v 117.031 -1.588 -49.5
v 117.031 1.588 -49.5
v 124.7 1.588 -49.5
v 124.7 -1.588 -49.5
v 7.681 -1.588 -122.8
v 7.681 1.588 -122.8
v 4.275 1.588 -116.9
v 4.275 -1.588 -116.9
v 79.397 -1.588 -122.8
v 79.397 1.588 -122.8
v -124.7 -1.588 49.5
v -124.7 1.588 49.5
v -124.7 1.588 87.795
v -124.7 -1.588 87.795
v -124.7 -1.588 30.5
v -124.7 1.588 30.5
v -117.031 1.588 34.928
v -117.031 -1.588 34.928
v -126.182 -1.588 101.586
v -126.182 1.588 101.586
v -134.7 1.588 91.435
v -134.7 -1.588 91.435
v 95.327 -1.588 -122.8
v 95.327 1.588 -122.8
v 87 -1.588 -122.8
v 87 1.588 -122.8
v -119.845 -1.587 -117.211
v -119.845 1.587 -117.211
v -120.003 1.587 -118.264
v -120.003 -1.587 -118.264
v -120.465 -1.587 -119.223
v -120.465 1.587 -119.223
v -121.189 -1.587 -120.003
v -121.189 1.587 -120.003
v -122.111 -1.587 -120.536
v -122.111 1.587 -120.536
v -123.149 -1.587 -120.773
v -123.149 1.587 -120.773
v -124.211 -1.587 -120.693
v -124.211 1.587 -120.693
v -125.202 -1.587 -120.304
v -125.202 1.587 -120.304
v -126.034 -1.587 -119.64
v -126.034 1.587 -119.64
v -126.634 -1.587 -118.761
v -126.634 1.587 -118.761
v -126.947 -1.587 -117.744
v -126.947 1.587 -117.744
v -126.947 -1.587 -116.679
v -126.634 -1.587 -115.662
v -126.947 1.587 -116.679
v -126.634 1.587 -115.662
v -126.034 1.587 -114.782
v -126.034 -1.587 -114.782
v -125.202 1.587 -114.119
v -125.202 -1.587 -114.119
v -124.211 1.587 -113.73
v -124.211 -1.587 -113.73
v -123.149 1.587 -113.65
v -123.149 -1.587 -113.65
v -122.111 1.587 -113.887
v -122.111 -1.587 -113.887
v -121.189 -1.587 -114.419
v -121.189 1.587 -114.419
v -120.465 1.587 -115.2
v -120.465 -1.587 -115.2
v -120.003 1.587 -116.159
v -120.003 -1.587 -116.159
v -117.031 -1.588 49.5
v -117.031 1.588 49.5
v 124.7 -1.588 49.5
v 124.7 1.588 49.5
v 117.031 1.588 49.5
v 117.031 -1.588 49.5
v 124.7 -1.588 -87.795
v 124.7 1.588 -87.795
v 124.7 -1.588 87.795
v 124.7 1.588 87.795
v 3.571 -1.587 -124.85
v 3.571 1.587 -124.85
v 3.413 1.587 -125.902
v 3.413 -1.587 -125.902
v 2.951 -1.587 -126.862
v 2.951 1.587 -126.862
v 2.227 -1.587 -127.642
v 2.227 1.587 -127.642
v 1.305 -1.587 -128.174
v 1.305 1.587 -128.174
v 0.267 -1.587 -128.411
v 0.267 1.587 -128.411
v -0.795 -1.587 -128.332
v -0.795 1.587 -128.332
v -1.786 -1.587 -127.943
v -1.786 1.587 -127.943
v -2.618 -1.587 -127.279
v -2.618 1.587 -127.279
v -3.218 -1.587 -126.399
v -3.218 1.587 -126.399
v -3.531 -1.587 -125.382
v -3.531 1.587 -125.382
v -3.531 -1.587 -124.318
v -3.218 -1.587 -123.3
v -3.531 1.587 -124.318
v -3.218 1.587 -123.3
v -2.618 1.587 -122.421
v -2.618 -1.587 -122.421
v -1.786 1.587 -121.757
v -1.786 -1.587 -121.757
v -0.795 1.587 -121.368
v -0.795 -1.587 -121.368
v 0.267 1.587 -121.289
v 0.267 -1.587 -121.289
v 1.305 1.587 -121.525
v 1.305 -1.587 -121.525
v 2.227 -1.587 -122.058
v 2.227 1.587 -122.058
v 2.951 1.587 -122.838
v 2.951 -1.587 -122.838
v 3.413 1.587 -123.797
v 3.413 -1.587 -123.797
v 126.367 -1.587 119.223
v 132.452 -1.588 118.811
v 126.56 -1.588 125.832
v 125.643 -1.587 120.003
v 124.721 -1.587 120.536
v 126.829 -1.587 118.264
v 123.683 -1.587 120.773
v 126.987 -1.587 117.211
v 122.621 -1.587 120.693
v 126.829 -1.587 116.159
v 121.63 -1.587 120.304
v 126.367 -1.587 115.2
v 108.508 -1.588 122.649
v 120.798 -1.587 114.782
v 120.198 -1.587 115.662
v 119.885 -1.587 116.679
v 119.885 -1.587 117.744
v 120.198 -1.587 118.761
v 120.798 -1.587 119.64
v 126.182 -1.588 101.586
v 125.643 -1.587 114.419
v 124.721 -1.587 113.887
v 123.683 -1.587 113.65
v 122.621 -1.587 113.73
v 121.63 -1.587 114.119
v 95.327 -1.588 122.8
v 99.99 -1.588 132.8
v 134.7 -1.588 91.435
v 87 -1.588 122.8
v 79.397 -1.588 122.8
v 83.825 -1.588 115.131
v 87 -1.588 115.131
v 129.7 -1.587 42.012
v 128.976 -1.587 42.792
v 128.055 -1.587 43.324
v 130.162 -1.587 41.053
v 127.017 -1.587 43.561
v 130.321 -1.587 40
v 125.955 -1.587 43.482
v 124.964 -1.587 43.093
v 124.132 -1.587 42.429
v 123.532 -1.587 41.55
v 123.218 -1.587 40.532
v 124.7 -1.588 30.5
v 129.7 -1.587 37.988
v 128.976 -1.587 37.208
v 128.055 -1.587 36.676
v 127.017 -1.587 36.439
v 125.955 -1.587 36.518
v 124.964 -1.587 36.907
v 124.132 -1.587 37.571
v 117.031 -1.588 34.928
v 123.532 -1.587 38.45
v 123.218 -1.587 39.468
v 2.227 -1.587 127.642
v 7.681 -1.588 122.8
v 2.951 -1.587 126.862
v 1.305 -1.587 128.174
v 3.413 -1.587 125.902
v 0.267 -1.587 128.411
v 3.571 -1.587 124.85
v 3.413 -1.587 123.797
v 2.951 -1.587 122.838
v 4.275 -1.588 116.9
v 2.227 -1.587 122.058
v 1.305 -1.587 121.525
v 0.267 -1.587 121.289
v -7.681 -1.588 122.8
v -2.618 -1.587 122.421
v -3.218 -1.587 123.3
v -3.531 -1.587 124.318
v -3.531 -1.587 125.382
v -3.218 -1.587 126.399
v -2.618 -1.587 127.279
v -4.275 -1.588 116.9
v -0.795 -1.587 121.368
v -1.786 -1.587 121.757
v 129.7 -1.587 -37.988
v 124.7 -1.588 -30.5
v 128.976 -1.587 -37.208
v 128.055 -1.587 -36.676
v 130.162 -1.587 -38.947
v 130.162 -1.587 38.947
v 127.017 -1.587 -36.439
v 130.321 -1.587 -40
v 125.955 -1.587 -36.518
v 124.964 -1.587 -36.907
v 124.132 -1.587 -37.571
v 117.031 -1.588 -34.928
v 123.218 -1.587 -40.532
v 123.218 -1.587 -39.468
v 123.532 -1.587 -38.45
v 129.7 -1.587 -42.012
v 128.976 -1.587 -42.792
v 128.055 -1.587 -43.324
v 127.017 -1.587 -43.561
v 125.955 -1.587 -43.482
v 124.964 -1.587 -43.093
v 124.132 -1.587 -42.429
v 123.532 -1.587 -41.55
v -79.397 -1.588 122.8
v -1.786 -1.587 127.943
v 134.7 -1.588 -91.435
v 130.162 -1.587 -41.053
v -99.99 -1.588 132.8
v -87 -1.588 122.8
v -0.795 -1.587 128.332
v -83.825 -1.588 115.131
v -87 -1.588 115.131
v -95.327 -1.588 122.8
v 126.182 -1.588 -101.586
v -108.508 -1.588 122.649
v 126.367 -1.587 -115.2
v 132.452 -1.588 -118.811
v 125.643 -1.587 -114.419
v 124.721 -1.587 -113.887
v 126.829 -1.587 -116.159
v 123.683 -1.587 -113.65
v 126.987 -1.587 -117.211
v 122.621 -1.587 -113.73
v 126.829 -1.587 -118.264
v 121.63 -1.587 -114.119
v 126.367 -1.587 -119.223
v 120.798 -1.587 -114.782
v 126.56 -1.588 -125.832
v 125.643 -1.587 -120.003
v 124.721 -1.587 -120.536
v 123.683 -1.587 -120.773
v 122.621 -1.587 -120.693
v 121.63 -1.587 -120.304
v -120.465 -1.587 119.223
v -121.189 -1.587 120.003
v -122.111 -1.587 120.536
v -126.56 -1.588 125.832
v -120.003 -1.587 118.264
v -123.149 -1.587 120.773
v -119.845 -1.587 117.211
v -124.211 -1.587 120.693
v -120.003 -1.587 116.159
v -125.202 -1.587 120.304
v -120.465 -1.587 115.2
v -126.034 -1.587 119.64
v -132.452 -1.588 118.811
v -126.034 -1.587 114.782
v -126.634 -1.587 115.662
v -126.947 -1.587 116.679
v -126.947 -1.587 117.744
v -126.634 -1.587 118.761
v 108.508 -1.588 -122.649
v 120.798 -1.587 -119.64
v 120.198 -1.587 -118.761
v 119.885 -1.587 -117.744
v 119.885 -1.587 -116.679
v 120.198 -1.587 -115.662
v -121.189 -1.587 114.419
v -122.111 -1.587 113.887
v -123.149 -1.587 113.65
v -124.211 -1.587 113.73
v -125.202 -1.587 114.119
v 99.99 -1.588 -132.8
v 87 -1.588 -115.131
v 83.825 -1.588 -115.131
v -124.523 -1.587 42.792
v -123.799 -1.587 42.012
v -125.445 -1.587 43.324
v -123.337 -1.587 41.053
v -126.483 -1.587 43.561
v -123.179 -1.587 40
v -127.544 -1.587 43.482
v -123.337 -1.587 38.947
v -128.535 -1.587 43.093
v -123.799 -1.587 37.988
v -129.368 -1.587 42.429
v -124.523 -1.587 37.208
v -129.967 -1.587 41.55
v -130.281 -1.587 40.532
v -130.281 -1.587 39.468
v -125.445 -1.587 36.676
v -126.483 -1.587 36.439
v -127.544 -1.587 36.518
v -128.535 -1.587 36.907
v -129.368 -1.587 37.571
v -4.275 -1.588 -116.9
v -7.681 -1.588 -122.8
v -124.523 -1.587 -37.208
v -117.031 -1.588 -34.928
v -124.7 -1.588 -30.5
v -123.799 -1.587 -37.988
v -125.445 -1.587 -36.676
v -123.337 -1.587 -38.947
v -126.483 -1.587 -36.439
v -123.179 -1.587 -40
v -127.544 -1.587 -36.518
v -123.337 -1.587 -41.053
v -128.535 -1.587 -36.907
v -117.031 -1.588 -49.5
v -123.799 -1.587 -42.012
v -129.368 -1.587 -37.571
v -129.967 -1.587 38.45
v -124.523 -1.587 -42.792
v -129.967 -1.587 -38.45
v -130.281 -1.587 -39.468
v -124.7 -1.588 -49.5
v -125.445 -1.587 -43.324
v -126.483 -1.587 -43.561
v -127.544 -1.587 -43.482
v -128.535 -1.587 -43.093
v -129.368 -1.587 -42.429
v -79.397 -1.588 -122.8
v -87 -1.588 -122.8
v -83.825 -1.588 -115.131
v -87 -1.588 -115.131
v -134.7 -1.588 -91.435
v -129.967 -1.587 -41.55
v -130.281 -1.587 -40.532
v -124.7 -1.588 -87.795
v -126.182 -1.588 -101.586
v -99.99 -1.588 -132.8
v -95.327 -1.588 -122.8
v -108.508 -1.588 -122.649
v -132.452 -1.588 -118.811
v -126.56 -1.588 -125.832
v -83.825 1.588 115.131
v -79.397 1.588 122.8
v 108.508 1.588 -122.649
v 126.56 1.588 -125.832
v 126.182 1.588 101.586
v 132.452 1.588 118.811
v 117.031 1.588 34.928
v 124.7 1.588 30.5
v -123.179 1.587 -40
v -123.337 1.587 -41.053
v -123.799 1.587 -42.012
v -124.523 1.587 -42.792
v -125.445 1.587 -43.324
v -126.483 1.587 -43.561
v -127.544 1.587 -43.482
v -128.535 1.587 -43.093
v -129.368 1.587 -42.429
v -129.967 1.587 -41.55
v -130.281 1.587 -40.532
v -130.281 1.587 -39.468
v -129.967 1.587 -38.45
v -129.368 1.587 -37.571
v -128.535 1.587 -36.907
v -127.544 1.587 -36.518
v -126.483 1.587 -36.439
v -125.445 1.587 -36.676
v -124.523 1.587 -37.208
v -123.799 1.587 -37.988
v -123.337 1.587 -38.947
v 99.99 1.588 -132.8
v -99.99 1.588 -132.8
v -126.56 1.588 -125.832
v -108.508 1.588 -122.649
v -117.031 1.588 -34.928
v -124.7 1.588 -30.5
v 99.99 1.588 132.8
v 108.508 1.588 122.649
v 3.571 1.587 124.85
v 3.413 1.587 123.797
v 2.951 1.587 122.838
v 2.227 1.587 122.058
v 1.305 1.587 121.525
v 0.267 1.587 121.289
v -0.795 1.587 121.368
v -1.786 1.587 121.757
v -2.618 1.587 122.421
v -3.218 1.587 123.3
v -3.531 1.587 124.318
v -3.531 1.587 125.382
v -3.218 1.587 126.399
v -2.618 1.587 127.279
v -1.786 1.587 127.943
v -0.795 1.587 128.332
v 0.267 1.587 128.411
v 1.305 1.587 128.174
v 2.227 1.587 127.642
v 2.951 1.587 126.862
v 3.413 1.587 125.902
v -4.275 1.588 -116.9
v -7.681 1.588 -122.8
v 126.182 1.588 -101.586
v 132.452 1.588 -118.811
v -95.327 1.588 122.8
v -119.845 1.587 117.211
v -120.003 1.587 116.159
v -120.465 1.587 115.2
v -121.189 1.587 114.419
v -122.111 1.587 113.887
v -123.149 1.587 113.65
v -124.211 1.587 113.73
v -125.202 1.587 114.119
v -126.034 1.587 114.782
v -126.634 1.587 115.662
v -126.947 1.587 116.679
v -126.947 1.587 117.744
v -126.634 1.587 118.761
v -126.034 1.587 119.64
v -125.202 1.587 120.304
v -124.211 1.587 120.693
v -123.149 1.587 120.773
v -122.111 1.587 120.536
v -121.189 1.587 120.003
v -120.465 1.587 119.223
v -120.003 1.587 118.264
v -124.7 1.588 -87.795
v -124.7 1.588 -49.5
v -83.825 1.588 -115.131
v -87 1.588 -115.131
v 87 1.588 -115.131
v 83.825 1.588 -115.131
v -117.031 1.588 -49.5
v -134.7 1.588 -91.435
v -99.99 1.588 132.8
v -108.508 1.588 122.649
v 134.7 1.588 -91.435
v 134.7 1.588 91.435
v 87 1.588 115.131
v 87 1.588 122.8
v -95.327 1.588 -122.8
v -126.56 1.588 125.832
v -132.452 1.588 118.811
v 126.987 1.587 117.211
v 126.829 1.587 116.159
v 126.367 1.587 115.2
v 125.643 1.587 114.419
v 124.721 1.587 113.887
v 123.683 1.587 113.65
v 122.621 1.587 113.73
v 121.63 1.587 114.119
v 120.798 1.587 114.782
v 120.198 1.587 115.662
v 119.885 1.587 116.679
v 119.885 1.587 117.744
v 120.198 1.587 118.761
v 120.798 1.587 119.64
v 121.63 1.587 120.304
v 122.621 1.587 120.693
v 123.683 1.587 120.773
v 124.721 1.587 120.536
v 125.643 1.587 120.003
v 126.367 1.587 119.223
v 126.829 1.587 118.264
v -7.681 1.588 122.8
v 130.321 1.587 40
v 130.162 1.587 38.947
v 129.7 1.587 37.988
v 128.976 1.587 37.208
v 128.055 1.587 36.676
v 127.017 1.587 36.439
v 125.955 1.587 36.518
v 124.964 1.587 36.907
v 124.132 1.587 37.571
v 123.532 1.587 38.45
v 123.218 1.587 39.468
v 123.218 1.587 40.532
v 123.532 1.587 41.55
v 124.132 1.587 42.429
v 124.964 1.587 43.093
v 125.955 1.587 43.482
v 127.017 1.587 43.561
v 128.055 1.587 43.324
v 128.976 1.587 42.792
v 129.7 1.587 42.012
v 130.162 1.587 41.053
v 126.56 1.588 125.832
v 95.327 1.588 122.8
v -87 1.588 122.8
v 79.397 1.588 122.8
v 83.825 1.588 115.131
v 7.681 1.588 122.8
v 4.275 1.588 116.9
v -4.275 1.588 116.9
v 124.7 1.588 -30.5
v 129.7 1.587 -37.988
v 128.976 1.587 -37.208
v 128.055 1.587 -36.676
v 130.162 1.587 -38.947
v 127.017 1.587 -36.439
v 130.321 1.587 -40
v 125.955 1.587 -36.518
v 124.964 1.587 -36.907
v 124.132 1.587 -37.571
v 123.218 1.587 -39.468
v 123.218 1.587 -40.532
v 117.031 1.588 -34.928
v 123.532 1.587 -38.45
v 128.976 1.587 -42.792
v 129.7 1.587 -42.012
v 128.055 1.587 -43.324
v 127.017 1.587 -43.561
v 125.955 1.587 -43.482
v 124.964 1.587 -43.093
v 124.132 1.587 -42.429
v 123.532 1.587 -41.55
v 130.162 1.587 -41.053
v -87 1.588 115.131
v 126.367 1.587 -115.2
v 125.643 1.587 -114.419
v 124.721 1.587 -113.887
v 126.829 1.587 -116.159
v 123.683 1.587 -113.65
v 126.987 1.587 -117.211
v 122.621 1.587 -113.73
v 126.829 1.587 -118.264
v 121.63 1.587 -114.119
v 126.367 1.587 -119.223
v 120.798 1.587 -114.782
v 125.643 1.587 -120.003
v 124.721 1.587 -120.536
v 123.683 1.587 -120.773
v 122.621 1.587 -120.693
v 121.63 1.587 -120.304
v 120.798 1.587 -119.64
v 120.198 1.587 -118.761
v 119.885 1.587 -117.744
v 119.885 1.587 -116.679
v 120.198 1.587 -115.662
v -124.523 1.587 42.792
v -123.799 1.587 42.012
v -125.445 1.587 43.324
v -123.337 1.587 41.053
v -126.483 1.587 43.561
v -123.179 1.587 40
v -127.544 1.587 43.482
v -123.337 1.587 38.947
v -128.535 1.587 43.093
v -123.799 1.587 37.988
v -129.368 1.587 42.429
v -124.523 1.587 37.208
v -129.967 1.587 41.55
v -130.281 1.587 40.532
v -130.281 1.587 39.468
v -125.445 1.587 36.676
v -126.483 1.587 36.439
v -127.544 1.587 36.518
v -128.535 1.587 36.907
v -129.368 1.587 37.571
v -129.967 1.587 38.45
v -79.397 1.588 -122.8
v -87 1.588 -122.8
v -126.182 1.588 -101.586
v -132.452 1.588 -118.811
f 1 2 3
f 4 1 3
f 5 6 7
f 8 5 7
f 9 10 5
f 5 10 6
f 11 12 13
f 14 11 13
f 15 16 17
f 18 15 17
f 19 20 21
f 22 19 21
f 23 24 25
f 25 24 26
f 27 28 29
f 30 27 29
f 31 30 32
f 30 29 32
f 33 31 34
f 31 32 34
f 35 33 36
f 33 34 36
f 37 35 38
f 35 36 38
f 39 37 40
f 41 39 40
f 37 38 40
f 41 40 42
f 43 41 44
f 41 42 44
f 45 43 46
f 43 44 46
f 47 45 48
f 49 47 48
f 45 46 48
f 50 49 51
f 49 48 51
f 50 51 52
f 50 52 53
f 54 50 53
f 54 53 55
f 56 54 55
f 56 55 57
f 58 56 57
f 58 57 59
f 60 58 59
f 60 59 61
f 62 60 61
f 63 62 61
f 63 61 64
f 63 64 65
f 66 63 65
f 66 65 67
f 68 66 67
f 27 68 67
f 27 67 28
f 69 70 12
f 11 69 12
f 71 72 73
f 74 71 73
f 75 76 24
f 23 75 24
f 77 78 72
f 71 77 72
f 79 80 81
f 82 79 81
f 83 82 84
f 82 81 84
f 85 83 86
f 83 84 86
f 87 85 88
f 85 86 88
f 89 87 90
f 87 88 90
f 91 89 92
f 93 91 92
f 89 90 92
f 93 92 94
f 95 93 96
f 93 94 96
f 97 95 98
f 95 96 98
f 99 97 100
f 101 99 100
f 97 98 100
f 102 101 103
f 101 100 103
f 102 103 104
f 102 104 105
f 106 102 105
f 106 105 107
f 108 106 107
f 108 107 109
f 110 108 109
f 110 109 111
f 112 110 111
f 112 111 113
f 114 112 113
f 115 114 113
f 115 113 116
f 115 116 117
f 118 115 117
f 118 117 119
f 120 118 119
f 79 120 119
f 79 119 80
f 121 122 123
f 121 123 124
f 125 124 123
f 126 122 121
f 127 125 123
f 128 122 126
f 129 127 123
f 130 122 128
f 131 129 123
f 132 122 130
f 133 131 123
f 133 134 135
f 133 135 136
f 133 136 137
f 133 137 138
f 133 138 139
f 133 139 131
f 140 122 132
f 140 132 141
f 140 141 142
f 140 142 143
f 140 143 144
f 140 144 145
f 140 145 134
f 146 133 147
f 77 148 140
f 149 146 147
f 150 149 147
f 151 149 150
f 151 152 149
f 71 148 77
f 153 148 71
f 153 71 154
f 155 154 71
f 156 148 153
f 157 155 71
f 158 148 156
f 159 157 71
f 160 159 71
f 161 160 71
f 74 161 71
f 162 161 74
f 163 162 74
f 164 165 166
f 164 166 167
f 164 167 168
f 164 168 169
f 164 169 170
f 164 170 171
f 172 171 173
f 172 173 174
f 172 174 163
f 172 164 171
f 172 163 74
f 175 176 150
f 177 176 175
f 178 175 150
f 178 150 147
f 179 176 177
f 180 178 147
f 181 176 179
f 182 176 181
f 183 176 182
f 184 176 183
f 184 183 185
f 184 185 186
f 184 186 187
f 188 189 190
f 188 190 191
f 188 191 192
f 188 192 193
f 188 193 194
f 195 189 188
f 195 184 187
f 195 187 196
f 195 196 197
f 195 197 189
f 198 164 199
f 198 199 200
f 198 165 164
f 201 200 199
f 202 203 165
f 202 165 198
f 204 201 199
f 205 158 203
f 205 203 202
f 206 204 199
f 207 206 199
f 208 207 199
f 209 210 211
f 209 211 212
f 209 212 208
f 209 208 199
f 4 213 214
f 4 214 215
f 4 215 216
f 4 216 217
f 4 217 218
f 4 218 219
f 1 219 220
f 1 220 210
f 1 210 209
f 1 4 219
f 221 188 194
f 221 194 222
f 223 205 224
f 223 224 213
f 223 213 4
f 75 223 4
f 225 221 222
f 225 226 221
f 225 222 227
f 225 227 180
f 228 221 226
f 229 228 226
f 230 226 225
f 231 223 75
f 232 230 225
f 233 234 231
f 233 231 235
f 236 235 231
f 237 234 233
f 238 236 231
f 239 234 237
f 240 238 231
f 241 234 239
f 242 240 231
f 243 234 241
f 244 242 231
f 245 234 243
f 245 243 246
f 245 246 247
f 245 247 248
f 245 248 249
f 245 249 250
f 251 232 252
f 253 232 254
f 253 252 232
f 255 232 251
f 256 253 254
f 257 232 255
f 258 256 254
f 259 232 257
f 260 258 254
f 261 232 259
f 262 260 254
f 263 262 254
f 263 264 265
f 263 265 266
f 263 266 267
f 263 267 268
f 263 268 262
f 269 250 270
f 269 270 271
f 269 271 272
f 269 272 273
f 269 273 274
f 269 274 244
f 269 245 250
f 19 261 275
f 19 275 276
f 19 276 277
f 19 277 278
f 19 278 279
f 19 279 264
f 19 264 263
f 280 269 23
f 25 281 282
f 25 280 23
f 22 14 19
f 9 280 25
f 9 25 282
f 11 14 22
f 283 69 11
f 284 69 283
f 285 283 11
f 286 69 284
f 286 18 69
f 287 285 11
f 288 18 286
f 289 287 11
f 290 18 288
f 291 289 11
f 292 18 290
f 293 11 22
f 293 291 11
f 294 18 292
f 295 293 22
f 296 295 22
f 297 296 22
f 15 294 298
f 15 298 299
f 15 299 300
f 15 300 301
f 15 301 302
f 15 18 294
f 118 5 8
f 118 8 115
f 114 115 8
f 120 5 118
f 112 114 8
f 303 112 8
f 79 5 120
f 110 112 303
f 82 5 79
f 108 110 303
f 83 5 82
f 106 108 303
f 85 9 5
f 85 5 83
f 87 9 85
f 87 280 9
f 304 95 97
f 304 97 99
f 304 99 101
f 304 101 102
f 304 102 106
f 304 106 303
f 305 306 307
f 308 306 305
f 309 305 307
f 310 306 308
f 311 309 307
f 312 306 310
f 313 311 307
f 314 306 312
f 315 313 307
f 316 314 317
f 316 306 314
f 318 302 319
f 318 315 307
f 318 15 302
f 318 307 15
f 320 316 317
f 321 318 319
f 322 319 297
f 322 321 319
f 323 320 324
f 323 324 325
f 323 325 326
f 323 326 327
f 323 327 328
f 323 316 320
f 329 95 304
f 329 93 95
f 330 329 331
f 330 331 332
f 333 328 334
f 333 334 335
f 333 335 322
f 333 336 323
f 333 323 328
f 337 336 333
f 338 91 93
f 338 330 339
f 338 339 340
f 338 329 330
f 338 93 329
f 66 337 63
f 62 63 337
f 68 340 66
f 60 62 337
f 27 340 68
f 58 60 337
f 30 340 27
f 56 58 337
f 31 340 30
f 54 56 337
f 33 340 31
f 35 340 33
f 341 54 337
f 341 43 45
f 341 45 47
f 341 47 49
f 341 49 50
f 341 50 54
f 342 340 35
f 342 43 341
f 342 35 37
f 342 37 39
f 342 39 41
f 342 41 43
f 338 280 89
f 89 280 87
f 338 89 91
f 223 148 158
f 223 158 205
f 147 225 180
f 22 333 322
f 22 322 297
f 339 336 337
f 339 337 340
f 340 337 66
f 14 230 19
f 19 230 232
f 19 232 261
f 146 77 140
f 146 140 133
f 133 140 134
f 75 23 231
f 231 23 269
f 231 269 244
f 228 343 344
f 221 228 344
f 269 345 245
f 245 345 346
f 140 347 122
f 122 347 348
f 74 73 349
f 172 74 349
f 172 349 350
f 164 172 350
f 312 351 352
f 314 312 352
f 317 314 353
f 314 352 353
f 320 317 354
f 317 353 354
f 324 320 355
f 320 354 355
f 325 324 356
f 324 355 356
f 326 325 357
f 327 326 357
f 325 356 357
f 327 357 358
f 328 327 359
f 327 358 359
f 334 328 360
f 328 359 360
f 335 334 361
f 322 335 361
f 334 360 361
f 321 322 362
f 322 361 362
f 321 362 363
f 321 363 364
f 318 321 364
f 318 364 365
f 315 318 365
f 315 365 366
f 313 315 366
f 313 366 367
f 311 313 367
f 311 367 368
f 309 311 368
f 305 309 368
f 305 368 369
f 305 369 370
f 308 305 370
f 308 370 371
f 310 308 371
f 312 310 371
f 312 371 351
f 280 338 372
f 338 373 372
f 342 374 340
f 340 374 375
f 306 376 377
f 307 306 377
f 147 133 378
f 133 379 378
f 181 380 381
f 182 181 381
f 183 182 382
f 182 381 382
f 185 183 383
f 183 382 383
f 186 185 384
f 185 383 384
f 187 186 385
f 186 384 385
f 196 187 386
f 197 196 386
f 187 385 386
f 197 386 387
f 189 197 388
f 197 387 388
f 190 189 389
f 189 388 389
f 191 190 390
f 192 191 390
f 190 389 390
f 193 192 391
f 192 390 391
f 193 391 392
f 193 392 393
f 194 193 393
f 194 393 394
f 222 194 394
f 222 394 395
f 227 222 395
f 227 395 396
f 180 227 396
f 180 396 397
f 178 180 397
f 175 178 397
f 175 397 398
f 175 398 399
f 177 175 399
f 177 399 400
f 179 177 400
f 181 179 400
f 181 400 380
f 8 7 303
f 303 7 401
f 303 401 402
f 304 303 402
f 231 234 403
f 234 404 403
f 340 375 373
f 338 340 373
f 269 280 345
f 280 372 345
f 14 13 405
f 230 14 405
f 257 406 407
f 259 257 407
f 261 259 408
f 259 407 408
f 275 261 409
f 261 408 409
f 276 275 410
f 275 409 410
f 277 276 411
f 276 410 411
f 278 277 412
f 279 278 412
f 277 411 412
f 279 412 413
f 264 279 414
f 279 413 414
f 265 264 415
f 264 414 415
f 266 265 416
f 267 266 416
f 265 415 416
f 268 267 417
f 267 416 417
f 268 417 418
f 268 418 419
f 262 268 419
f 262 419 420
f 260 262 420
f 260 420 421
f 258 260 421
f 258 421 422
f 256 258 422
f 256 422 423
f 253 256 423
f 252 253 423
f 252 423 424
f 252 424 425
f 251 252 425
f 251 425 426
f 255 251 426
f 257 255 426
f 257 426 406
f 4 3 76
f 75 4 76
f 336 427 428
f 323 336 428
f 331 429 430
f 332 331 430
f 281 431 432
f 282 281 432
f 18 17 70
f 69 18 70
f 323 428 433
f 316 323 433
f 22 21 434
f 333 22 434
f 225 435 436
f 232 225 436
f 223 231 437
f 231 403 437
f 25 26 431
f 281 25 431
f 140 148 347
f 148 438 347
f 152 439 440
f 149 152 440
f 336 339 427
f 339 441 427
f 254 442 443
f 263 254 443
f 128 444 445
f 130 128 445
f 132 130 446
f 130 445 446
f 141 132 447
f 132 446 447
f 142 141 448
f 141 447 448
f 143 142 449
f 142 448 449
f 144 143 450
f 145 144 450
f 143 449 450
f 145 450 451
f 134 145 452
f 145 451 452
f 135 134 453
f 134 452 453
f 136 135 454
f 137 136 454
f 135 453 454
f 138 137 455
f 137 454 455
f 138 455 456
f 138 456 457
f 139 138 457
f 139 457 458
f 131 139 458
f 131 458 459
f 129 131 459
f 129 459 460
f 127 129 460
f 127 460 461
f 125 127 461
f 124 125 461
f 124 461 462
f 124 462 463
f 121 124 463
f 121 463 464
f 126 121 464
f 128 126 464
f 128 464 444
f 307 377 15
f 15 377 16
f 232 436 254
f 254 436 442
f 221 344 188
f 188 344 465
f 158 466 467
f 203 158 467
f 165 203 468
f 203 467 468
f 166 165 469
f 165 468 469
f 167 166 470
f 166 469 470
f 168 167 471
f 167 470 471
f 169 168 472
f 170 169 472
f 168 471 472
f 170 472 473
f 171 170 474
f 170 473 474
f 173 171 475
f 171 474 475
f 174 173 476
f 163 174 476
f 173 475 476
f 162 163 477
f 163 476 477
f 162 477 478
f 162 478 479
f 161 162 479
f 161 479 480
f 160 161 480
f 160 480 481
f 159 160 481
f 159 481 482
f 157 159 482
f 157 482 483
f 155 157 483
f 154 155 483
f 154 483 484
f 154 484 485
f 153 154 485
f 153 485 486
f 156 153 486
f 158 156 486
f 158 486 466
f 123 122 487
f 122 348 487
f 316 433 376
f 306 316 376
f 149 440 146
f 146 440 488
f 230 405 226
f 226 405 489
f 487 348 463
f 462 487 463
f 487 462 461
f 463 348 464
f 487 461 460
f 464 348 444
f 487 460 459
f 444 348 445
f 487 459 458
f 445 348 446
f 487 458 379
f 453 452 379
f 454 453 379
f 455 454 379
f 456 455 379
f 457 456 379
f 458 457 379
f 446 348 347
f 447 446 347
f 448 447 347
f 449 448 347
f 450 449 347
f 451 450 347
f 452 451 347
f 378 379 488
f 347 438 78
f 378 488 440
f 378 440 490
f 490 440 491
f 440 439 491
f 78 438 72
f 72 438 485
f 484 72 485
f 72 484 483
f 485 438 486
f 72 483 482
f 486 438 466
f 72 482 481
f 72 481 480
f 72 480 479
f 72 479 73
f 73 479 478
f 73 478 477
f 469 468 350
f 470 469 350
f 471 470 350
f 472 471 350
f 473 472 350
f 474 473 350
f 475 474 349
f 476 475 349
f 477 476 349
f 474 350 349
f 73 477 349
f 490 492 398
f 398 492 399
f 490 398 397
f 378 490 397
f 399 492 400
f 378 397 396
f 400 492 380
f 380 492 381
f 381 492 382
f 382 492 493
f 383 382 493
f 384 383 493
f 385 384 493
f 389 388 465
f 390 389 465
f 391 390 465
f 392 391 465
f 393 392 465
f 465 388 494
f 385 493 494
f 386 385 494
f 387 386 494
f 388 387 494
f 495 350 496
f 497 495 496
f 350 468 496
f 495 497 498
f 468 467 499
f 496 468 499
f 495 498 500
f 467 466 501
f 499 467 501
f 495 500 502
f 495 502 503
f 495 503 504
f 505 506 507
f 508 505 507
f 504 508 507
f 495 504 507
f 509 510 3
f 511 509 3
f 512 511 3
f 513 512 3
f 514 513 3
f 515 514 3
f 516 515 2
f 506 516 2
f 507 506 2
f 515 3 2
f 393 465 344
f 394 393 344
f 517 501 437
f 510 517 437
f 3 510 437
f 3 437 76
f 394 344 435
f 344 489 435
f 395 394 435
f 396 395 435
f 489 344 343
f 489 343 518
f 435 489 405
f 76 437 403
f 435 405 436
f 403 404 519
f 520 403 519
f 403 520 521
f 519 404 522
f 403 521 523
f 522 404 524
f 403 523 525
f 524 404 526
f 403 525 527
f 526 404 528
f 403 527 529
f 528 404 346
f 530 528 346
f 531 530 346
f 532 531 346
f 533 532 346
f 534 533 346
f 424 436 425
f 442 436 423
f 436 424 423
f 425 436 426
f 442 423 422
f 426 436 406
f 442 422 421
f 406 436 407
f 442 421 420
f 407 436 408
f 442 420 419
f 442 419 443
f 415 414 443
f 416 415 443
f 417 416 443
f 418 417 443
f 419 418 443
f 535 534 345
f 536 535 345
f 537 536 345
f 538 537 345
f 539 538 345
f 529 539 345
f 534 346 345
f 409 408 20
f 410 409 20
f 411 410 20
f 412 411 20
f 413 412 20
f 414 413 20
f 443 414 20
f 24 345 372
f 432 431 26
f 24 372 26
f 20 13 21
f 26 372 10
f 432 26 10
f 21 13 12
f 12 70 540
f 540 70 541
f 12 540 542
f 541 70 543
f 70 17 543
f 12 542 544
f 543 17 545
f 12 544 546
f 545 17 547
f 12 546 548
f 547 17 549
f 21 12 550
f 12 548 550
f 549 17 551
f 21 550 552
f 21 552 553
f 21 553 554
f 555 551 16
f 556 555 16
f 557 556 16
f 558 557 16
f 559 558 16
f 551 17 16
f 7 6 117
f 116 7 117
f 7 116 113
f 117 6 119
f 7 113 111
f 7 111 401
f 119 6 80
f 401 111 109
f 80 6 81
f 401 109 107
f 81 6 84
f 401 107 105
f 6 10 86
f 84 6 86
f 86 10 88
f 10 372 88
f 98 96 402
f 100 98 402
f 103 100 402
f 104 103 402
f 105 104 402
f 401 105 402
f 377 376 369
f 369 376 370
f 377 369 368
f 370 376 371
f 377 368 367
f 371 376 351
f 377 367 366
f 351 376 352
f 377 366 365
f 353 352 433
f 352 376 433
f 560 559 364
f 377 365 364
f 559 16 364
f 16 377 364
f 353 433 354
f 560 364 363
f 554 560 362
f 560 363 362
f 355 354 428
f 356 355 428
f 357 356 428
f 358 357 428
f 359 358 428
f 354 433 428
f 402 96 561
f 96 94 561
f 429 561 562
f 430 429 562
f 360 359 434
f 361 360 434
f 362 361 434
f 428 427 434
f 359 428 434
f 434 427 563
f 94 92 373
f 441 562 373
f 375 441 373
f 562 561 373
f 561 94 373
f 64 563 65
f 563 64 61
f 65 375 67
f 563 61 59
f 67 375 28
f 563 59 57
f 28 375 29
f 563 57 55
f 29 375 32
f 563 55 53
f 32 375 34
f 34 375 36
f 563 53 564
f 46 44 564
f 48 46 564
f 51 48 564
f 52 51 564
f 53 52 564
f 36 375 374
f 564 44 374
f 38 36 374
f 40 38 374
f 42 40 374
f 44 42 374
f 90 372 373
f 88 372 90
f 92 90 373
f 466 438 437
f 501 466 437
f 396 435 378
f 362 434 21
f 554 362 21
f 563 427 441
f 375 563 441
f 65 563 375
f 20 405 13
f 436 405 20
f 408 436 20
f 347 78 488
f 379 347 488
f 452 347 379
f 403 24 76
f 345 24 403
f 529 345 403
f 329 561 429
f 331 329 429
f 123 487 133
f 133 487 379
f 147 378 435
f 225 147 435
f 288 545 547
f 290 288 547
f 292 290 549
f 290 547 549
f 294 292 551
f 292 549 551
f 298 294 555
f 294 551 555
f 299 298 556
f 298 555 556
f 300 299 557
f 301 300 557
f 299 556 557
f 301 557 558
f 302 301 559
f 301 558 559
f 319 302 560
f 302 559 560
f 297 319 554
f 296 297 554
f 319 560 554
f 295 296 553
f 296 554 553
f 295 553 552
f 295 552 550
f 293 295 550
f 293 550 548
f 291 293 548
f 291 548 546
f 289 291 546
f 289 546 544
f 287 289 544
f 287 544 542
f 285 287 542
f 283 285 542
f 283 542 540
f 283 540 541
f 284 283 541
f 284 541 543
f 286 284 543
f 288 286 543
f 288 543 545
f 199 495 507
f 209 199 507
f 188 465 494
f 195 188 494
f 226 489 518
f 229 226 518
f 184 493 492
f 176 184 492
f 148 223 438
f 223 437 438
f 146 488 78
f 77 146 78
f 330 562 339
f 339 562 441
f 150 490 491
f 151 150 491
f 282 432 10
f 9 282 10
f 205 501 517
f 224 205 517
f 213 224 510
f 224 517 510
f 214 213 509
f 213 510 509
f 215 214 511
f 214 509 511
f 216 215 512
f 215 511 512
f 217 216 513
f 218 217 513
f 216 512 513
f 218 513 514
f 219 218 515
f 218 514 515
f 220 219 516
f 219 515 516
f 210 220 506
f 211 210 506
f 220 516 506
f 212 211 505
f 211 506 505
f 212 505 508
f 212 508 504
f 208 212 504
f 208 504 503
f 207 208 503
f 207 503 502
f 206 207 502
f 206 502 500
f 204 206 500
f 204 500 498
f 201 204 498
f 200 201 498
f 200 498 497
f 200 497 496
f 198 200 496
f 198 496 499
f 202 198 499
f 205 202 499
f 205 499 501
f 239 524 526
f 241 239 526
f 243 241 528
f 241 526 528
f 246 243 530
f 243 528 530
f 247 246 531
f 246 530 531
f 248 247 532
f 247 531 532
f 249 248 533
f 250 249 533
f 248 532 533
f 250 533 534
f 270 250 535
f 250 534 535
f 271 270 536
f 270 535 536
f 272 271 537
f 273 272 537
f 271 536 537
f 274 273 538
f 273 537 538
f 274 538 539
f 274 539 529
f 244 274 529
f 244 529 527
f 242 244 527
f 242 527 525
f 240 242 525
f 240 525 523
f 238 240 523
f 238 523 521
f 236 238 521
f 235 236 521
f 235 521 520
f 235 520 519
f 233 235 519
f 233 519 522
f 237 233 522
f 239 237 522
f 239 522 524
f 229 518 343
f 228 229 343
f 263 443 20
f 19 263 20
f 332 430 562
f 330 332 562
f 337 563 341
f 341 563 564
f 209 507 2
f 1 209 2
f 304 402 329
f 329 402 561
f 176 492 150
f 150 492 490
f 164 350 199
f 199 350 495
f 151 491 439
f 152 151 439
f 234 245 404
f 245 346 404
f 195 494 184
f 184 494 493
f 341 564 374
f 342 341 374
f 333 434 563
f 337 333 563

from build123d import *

# Parameters (mm, degrees)
BOSS_EXTRUDE1_DEPTH     = 1.5875
F_1_4_CLEARANCE_HOLE1_D = 7.14248


with BuildPart() as part:
    # Sketch1 → Boss-Extrude1 (new, symmetric)
    with BuildSketch(Plane(origin=(0, 0, 0), x_dir=(1, 0, 0), z_dir=(0, 1, 0))):
        Polygon((-108.508102479, 122.649104887), (-99.990490133, 132.8), (99.990490133, 132.8), (108.508102479, 122.649104887), (126.560486405, 125.832227239), (132.451914797, 118.811096288), (126.182387654, 101.585712032), (134.7, 91.434816919), (134.7, -91.434816919), (126.182387654, -101.585712032), (132.451914797, -118.811096288), (126.560486405, -125.832227239), (108.508102479, -122.649104887), (99.990490133, -132.8), (-99.990490133, -132.8), (-108.508102479, -122.649104887), (-126.560486405, -125.832227239), (-132.451914797, -118.811096288), (-126.182387654, -101.585712032), (-134.7, -91.434816919), (-134.7, 91.434816919), (-126.182387654, 101.585712032), (-132.451914797, 118.811096288), (-126.560486405, 125.832227239), align=None)
        Polygon((-95.327413552, 122.8), (-124.7, 87.795114576), (-124.7, 49.5), (-117.031174581, 49.5), (-117.031174581, 34.92759842), (-124.7, 30.5), (-124.7, -30.5), (-117.031174581, -34.92759842), (-117.031174581, -49.5), (-124.7, -49.5), (-124.7, -87.795114576), (-95.327413552, -122.8), (-87, -122.8), (-87, -115.131174581), (-83.825, -115.131174581), (-79.39740158, -122.8), (-7.681406121, -122.8), (-4.274808593, -116.8996), (4.274808593, -116.8996), (7.681406121, -122.8), (79.39740158, -122.8), (83.825, -115.131174581), (87, -115.131174581), (87, -122.8), (95.327413552, -122.8), (124.7, -87.795114576), (124.7, -49.5), (117.031174581, -49.5), (117.031174581, -34.92759842), (124.7, -30.5), (124.7, 30.5), (117.031174581, 34.92759842), (117.031174581, 49.5), (124.7, 49.5), (124.7, 87.795114576), (95.327413552, 122.8), (87, 122.8), (87, 115.131174581), (83.825, 115.131174581), (79.39740158, 122.8), (7.681406121, 122.8), (4.274808593, 116.8996), (-4.274808593, 116.8996), (-7.681406121, 122.8), (-79.39740158, 122.8), (-83.825, 115.131174581), (-87, 115.131174581), (-87, 122.8), align=None, mode=Mode.SUBTRACT)
    extrude(amount=BOSS_EXTRUDE1_DEPTH, both=True)

    # 1/4 Clearance Hole1 (through all)
    with Locations(Plane(origin=(0, -1.5875, 0), x_dir=(-1, 0, 0), z_dir=(0, -1, 0))):
        with Locations((-123.415994069, 117.211371709), (-126.7498, 40), (0, 124.8498), (123.415994069, 117.211371709), (126.7498, 40), (126.7498, -40), (123.415994069, -117.211371709), (0, -124.8498), (-123.415994069, -117.211371709), (-126.7498, -40)):
            Hole(F_1_4_CLEARANCE_HOLE1_D / 2)


solid = part.part
